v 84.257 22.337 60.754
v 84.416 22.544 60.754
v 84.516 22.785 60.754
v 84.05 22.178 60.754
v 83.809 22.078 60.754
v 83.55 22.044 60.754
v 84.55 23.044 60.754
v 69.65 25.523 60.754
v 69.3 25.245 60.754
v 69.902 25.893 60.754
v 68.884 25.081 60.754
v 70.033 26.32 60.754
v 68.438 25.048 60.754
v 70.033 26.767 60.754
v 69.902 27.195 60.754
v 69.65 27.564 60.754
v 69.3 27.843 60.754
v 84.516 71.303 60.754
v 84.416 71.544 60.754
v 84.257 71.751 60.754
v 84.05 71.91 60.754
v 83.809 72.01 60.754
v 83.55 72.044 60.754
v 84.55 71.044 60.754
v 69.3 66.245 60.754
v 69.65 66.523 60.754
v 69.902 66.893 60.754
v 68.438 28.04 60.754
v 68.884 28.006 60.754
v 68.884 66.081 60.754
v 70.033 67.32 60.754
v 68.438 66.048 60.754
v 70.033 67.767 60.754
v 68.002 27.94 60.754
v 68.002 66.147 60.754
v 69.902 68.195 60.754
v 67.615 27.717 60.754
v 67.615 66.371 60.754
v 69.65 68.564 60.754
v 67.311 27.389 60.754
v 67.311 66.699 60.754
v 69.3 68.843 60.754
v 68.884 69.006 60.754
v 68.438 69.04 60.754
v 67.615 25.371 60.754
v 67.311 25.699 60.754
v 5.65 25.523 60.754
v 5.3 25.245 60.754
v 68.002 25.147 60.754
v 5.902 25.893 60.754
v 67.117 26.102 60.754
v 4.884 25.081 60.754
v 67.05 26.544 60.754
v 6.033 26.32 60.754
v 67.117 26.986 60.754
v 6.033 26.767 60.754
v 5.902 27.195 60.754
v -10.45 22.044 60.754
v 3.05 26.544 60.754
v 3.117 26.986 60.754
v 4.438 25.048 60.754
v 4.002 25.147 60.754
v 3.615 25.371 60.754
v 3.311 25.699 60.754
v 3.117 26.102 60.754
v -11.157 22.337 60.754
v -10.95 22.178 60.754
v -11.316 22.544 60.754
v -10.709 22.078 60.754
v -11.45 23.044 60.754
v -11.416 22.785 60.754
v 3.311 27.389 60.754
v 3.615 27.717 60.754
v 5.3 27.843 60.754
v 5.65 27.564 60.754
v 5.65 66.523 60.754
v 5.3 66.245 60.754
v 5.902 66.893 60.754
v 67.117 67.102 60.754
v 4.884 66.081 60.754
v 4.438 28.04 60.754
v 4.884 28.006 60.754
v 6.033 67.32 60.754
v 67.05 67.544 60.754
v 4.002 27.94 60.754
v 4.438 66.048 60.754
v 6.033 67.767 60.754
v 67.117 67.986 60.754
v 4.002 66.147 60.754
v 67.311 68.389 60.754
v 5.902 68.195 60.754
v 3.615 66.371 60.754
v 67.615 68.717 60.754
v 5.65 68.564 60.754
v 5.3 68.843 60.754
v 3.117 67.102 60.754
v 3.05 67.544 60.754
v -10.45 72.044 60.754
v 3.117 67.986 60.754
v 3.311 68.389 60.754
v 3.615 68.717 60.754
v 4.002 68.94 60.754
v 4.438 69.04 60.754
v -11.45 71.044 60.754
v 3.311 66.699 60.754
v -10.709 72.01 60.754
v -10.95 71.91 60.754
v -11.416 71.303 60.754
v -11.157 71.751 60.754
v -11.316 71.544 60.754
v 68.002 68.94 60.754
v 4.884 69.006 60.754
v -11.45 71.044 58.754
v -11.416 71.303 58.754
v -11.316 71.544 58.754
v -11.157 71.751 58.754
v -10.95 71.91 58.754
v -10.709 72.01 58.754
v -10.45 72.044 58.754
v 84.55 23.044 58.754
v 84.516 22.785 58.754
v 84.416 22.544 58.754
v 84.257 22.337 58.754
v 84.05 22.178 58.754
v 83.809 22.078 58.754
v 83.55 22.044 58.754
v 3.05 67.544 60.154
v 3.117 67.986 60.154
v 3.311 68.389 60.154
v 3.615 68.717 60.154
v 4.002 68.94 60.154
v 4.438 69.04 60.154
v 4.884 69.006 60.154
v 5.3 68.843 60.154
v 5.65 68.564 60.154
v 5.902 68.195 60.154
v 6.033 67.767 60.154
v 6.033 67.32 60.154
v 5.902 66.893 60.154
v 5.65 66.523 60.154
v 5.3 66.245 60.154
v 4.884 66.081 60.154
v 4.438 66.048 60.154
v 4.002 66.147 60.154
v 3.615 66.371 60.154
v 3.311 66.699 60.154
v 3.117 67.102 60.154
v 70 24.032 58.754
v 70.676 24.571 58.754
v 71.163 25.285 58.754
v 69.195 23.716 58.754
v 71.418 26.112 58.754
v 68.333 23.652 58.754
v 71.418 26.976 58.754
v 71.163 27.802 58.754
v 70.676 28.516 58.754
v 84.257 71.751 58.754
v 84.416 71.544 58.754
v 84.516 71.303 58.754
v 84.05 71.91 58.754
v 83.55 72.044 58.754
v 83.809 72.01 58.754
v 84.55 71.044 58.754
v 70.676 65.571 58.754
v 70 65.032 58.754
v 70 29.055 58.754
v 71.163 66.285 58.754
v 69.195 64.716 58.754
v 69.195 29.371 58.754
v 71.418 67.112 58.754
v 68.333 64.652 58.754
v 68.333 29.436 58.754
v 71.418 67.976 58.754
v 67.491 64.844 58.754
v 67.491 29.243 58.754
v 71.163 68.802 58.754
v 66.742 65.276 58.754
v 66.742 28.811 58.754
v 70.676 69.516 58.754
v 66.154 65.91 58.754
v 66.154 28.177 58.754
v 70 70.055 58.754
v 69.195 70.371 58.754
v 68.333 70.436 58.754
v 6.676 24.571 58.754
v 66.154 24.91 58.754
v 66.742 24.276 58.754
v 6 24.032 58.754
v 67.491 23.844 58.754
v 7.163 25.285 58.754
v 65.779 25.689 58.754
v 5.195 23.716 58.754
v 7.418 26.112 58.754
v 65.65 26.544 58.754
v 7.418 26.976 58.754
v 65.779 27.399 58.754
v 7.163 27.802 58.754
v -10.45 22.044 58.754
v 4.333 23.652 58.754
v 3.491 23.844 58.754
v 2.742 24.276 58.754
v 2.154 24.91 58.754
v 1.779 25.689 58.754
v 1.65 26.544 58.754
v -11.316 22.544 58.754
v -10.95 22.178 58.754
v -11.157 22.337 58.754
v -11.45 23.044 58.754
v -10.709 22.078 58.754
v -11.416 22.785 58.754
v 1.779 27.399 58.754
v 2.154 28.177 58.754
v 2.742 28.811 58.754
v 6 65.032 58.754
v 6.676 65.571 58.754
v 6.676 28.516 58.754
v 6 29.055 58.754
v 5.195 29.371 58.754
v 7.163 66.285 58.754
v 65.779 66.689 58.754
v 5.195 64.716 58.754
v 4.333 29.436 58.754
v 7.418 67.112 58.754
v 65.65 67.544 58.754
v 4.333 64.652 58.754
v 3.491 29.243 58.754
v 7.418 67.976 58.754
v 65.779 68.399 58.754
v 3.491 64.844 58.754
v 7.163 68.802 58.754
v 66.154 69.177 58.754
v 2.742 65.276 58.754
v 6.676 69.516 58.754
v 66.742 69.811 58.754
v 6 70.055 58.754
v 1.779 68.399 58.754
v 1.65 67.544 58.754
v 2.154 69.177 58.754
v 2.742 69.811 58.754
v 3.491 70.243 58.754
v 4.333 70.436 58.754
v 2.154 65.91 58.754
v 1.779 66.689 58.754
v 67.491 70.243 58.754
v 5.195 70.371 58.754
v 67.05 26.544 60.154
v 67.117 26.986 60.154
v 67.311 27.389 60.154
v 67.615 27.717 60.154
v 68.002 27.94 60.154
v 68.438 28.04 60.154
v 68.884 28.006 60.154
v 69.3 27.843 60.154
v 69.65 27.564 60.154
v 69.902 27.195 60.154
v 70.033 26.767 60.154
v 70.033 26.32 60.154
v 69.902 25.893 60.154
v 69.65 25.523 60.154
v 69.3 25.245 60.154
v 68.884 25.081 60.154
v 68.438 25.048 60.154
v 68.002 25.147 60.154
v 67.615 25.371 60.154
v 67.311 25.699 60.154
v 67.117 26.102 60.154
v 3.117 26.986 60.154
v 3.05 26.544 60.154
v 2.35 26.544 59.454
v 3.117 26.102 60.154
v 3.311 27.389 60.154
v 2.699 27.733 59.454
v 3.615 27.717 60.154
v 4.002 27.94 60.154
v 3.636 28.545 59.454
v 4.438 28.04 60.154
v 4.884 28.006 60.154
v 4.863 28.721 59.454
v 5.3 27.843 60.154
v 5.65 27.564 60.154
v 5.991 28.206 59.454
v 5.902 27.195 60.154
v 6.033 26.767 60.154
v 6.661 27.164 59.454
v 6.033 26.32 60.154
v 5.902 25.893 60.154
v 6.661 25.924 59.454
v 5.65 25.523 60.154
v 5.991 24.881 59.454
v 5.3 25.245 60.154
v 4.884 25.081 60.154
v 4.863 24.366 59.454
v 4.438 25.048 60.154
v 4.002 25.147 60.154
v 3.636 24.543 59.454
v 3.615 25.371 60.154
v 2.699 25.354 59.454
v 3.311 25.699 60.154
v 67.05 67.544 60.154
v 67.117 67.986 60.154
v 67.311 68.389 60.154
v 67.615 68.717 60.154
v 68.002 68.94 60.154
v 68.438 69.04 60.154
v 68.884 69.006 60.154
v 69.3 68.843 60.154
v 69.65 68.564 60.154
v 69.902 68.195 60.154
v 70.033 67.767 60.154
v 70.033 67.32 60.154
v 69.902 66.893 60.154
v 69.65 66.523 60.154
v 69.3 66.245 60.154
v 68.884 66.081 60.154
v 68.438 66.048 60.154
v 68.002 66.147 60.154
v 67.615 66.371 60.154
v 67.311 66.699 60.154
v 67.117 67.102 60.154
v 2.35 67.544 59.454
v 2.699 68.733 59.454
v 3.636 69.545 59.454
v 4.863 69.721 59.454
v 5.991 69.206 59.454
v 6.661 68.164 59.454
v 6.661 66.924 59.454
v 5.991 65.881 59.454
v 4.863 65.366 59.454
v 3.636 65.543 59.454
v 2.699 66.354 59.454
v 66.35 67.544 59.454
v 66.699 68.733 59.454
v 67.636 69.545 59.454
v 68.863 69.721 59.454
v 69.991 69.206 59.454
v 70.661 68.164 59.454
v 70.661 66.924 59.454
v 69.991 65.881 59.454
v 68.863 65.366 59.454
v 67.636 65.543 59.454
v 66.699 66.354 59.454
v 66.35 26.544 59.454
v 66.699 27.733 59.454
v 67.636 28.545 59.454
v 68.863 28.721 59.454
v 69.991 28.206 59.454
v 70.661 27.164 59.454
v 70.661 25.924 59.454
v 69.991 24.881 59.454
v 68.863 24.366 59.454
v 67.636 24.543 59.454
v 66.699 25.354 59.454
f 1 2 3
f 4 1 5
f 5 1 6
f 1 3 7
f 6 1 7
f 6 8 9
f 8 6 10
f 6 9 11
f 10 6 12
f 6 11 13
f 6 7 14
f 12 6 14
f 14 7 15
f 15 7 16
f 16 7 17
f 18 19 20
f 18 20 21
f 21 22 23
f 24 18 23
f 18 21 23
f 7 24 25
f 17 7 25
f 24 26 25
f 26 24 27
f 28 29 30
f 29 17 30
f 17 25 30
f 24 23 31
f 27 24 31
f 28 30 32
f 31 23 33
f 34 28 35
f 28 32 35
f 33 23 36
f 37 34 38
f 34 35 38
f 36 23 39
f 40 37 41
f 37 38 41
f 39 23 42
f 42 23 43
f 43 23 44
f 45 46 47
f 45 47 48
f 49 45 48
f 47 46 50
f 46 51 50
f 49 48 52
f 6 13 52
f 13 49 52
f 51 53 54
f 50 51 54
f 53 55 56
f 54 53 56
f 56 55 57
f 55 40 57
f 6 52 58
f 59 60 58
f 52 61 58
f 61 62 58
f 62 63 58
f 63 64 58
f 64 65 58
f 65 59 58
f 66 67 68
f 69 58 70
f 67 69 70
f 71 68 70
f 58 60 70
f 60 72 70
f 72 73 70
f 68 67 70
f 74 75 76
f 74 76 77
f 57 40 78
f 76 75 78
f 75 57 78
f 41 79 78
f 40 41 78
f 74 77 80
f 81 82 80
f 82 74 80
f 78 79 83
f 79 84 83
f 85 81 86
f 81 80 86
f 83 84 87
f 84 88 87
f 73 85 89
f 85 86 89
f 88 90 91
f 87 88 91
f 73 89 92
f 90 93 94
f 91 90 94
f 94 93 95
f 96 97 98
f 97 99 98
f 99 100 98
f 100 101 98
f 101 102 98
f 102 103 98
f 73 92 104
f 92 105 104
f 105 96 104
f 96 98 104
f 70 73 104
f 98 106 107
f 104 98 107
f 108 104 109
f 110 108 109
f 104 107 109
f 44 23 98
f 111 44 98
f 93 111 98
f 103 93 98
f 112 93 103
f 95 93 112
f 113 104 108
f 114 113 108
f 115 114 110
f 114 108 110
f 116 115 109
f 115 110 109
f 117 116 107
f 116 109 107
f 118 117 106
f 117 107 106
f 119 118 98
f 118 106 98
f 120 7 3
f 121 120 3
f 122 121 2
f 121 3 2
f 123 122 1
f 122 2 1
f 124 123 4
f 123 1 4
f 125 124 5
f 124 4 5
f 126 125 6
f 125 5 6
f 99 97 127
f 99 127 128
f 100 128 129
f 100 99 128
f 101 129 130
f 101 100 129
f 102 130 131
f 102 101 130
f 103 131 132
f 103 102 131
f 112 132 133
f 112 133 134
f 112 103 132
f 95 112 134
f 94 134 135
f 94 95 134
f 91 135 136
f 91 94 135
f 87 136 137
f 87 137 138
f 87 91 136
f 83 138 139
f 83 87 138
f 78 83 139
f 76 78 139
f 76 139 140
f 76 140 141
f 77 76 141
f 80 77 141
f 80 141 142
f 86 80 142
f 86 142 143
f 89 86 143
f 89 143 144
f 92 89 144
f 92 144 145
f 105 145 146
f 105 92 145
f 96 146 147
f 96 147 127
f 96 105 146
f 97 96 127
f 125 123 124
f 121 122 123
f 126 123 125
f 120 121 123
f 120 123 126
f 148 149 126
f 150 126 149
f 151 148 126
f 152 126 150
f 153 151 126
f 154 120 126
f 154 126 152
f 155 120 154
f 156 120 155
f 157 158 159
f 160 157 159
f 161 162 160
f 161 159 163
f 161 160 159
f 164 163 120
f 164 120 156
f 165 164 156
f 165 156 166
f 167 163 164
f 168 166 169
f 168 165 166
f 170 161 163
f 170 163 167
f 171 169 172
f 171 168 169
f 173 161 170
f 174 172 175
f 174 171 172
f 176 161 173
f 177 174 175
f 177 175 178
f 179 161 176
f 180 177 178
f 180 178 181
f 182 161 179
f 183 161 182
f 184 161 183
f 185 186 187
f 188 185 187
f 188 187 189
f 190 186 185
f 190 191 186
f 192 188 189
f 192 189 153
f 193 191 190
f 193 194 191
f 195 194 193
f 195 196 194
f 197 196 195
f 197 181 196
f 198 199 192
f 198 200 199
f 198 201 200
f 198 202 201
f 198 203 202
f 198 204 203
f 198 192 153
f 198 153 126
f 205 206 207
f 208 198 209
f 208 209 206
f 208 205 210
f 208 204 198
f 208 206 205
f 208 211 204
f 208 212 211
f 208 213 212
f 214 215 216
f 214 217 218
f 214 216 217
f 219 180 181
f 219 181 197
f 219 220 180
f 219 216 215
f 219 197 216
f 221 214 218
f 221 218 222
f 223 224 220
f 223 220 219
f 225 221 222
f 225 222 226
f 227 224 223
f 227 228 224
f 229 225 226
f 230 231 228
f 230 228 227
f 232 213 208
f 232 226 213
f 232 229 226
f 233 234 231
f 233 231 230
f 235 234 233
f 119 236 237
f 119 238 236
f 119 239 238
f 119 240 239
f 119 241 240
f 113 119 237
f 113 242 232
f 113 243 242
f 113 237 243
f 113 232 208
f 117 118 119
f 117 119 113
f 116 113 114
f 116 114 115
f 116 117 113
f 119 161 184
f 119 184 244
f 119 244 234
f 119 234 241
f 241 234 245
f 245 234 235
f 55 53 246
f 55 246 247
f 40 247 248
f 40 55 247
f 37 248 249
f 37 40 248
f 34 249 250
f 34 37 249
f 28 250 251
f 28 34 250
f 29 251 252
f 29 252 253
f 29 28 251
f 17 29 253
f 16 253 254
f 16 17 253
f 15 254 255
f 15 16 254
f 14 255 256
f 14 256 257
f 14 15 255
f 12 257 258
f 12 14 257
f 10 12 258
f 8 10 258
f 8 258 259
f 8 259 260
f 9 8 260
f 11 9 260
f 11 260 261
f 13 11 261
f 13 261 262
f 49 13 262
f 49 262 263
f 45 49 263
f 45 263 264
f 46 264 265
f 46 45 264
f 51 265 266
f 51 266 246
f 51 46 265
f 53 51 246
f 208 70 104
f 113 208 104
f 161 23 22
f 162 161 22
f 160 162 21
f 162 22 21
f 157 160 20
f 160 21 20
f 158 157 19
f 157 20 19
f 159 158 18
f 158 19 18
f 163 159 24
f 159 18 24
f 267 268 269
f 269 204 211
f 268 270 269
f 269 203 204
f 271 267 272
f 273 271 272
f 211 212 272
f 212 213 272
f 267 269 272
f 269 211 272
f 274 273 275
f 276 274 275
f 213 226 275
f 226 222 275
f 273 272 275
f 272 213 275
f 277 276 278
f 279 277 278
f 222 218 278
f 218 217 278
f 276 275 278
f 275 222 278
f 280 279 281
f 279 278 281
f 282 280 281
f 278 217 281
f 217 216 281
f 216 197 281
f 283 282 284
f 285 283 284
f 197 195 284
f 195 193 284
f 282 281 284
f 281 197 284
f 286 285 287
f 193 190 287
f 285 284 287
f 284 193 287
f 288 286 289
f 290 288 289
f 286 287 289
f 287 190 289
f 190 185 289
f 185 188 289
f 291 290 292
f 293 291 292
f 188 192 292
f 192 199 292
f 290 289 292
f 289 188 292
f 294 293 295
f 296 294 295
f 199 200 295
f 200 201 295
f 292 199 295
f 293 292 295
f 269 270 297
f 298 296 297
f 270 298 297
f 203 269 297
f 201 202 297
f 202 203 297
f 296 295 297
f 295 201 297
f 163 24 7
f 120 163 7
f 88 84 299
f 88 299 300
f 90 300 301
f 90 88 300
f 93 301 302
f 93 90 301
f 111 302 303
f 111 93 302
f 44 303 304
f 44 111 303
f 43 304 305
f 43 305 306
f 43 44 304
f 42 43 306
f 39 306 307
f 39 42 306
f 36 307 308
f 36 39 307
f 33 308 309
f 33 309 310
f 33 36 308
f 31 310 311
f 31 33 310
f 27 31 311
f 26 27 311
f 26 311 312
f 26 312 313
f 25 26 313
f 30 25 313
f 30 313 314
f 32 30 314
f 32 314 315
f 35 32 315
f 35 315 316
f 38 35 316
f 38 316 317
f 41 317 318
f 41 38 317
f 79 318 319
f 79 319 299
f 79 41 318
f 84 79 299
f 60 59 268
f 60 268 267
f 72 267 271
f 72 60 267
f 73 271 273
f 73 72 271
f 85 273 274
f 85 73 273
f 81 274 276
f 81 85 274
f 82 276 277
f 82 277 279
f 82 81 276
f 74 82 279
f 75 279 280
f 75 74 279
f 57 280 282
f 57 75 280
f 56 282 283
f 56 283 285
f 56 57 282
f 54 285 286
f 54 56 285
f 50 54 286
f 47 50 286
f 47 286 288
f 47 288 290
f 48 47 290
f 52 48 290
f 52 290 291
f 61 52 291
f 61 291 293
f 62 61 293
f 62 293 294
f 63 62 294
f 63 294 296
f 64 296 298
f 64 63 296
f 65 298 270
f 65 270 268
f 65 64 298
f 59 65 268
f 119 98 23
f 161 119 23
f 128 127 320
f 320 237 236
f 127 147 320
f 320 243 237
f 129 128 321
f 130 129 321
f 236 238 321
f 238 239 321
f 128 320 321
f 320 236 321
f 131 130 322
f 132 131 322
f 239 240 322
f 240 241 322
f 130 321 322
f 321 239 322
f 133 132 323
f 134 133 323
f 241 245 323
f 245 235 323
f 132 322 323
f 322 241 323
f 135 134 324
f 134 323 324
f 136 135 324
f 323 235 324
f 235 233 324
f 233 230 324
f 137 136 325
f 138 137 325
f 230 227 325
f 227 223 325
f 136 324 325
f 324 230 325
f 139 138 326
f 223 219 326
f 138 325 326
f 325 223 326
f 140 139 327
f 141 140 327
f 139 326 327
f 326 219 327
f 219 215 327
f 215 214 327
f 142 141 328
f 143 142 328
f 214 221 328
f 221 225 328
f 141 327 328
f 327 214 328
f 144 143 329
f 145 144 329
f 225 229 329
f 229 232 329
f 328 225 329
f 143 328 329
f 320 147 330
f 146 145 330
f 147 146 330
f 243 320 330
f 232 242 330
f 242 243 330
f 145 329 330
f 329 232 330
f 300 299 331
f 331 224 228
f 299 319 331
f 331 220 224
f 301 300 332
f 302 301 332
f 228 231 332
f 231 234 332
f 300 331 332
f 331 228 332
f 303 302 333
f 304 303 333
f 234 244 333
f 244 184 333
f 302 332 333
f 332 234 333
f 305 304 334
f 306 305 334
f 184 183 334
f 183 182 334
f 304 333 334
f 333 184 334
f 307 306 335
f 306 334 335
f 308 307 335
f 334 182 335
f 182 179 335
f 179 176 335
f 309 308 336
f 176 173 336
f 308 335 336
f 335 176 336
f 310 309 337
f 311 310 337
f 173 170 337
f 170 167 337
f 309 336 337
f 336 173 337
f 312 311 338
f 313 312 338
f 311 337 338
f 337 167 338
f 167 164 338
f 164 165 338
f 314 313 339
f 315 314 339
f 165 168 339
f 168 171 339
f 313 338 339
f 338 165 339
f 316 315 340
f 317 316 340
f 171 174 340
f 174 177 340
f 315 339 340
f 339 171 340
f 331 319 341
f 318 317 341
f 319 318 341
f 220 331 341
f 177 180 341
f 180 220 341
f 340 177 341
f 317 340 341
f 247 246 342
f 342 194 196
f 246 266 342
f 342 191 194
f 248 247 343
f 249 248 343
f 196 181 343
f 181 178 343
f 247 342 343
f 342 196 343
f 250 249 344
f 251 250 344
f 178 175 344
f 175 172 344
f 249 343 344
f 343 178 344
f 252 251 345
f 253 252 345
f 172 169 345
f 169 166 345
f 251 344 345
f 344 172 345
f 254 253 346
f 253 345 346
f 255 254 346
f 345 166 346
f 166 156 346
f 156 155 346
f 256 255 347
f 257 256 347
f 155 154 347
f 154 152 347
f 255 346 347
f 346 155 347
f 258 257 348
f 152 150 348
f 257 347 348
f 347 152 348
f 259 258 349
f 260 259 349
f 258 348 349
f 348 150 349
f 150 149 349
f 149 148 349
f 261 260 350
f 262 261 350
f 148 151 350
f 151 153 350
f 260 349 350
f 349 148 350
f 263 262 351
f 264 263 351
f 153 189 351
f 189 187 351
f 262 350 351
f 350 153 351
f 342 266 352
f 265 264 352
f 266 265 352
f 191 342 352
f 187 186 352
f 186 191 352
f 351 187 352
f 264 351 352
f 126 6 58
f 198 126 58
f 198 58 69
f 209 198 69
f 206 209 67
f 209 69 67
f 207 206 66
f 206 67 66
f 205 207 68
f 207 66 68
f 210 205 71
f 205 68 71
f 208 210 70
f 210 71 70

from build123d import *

# Parameters (mm, degrees)
SKETCH_1_R      = 1.5
EXTRUDE_2_DEPTH = 2
CHAMFER_1_SIZE  = 1.4


with BuildPart() as part:
    # Эскиз1 → Бобышка-Вытянуть2 (new body)
    with BuildSketch(Plane(origin=(0, 0, 60.753798787), x_dir=(-1, 0, 0), z_dir=(0, 0, -1))):
        with BuildLine():
            Line((-84.550134069, 64.543755027), (-84.550134069, 29.543755027))
            Line((-84.550134069, 29.543755027), (-84.550134069, 23.043755027))
            ThreePointArc((-84.550134069, 23.043755027), (-84.25724085, 22.336648246), (-83.550134069, 22.043755027))
            Line((-83.550134069, 22.043755027), (10.449865931, 22.043755027))
            ThreePointArc((10.449865931, 22.043755027), (11.156972713, 22.336648246), (11.449865931, 23.043755027))
            Line((11.449865931, 23.043755027), (11.449865931, 71.043755027))
            ThreePointArc((11.449865931, 71.043755027), (11.156972713, 71.750861809), (10.449865931, 72.043755027))
            Line((10.449865931, 72.043755027), (-83.550134069, 72.043755027))
            ThreePointArc((-83.550134069, 72.043755027), (-84.25724085, 71.750861809), (-84.550134069, 71.043755027))
            Line((-84.550134069, 71.043755027), (-84.550134069, 64.543755027))
        make_face()
        with Locations((-4.550134069, 67.543755027)):
            Circle(SKETCH_1_R, mode=Mode.SUBTRACT)
        with Locations((-68.550134069, 67.543755027)):
            Circle(SKETCH_1_R, mode=Mode.SUBTRACT)
        with Locations((-68.550134069, 26.543755027)):
            Circle(SKETCH_1_R, mode=Mode.SUBTRACT)
        with Locations((-4.550134069, 26.543755027)):
            Circle(SKETCH_1_R, mode=Mode.SUBTRACT)
    extrude(amount=EXTRUDE_2_DEPTH)

    # Фаска1
    chamfer_1_edges = [part.edges().sort_by_distance(p)[0] for p in [
        (6.050134069, 67.543755027, 58.753798787),
        (70.050134069, 67.543755027, 58.753798787),
        (70.050134069, 26.543755027, 58.753798787),
        (6.050134069, 26.543755027, 58.753798787),
    ]]
    chamfer(chamfer_1_edges, length=CHAMFER_1_SIZE)


solid = part.part
